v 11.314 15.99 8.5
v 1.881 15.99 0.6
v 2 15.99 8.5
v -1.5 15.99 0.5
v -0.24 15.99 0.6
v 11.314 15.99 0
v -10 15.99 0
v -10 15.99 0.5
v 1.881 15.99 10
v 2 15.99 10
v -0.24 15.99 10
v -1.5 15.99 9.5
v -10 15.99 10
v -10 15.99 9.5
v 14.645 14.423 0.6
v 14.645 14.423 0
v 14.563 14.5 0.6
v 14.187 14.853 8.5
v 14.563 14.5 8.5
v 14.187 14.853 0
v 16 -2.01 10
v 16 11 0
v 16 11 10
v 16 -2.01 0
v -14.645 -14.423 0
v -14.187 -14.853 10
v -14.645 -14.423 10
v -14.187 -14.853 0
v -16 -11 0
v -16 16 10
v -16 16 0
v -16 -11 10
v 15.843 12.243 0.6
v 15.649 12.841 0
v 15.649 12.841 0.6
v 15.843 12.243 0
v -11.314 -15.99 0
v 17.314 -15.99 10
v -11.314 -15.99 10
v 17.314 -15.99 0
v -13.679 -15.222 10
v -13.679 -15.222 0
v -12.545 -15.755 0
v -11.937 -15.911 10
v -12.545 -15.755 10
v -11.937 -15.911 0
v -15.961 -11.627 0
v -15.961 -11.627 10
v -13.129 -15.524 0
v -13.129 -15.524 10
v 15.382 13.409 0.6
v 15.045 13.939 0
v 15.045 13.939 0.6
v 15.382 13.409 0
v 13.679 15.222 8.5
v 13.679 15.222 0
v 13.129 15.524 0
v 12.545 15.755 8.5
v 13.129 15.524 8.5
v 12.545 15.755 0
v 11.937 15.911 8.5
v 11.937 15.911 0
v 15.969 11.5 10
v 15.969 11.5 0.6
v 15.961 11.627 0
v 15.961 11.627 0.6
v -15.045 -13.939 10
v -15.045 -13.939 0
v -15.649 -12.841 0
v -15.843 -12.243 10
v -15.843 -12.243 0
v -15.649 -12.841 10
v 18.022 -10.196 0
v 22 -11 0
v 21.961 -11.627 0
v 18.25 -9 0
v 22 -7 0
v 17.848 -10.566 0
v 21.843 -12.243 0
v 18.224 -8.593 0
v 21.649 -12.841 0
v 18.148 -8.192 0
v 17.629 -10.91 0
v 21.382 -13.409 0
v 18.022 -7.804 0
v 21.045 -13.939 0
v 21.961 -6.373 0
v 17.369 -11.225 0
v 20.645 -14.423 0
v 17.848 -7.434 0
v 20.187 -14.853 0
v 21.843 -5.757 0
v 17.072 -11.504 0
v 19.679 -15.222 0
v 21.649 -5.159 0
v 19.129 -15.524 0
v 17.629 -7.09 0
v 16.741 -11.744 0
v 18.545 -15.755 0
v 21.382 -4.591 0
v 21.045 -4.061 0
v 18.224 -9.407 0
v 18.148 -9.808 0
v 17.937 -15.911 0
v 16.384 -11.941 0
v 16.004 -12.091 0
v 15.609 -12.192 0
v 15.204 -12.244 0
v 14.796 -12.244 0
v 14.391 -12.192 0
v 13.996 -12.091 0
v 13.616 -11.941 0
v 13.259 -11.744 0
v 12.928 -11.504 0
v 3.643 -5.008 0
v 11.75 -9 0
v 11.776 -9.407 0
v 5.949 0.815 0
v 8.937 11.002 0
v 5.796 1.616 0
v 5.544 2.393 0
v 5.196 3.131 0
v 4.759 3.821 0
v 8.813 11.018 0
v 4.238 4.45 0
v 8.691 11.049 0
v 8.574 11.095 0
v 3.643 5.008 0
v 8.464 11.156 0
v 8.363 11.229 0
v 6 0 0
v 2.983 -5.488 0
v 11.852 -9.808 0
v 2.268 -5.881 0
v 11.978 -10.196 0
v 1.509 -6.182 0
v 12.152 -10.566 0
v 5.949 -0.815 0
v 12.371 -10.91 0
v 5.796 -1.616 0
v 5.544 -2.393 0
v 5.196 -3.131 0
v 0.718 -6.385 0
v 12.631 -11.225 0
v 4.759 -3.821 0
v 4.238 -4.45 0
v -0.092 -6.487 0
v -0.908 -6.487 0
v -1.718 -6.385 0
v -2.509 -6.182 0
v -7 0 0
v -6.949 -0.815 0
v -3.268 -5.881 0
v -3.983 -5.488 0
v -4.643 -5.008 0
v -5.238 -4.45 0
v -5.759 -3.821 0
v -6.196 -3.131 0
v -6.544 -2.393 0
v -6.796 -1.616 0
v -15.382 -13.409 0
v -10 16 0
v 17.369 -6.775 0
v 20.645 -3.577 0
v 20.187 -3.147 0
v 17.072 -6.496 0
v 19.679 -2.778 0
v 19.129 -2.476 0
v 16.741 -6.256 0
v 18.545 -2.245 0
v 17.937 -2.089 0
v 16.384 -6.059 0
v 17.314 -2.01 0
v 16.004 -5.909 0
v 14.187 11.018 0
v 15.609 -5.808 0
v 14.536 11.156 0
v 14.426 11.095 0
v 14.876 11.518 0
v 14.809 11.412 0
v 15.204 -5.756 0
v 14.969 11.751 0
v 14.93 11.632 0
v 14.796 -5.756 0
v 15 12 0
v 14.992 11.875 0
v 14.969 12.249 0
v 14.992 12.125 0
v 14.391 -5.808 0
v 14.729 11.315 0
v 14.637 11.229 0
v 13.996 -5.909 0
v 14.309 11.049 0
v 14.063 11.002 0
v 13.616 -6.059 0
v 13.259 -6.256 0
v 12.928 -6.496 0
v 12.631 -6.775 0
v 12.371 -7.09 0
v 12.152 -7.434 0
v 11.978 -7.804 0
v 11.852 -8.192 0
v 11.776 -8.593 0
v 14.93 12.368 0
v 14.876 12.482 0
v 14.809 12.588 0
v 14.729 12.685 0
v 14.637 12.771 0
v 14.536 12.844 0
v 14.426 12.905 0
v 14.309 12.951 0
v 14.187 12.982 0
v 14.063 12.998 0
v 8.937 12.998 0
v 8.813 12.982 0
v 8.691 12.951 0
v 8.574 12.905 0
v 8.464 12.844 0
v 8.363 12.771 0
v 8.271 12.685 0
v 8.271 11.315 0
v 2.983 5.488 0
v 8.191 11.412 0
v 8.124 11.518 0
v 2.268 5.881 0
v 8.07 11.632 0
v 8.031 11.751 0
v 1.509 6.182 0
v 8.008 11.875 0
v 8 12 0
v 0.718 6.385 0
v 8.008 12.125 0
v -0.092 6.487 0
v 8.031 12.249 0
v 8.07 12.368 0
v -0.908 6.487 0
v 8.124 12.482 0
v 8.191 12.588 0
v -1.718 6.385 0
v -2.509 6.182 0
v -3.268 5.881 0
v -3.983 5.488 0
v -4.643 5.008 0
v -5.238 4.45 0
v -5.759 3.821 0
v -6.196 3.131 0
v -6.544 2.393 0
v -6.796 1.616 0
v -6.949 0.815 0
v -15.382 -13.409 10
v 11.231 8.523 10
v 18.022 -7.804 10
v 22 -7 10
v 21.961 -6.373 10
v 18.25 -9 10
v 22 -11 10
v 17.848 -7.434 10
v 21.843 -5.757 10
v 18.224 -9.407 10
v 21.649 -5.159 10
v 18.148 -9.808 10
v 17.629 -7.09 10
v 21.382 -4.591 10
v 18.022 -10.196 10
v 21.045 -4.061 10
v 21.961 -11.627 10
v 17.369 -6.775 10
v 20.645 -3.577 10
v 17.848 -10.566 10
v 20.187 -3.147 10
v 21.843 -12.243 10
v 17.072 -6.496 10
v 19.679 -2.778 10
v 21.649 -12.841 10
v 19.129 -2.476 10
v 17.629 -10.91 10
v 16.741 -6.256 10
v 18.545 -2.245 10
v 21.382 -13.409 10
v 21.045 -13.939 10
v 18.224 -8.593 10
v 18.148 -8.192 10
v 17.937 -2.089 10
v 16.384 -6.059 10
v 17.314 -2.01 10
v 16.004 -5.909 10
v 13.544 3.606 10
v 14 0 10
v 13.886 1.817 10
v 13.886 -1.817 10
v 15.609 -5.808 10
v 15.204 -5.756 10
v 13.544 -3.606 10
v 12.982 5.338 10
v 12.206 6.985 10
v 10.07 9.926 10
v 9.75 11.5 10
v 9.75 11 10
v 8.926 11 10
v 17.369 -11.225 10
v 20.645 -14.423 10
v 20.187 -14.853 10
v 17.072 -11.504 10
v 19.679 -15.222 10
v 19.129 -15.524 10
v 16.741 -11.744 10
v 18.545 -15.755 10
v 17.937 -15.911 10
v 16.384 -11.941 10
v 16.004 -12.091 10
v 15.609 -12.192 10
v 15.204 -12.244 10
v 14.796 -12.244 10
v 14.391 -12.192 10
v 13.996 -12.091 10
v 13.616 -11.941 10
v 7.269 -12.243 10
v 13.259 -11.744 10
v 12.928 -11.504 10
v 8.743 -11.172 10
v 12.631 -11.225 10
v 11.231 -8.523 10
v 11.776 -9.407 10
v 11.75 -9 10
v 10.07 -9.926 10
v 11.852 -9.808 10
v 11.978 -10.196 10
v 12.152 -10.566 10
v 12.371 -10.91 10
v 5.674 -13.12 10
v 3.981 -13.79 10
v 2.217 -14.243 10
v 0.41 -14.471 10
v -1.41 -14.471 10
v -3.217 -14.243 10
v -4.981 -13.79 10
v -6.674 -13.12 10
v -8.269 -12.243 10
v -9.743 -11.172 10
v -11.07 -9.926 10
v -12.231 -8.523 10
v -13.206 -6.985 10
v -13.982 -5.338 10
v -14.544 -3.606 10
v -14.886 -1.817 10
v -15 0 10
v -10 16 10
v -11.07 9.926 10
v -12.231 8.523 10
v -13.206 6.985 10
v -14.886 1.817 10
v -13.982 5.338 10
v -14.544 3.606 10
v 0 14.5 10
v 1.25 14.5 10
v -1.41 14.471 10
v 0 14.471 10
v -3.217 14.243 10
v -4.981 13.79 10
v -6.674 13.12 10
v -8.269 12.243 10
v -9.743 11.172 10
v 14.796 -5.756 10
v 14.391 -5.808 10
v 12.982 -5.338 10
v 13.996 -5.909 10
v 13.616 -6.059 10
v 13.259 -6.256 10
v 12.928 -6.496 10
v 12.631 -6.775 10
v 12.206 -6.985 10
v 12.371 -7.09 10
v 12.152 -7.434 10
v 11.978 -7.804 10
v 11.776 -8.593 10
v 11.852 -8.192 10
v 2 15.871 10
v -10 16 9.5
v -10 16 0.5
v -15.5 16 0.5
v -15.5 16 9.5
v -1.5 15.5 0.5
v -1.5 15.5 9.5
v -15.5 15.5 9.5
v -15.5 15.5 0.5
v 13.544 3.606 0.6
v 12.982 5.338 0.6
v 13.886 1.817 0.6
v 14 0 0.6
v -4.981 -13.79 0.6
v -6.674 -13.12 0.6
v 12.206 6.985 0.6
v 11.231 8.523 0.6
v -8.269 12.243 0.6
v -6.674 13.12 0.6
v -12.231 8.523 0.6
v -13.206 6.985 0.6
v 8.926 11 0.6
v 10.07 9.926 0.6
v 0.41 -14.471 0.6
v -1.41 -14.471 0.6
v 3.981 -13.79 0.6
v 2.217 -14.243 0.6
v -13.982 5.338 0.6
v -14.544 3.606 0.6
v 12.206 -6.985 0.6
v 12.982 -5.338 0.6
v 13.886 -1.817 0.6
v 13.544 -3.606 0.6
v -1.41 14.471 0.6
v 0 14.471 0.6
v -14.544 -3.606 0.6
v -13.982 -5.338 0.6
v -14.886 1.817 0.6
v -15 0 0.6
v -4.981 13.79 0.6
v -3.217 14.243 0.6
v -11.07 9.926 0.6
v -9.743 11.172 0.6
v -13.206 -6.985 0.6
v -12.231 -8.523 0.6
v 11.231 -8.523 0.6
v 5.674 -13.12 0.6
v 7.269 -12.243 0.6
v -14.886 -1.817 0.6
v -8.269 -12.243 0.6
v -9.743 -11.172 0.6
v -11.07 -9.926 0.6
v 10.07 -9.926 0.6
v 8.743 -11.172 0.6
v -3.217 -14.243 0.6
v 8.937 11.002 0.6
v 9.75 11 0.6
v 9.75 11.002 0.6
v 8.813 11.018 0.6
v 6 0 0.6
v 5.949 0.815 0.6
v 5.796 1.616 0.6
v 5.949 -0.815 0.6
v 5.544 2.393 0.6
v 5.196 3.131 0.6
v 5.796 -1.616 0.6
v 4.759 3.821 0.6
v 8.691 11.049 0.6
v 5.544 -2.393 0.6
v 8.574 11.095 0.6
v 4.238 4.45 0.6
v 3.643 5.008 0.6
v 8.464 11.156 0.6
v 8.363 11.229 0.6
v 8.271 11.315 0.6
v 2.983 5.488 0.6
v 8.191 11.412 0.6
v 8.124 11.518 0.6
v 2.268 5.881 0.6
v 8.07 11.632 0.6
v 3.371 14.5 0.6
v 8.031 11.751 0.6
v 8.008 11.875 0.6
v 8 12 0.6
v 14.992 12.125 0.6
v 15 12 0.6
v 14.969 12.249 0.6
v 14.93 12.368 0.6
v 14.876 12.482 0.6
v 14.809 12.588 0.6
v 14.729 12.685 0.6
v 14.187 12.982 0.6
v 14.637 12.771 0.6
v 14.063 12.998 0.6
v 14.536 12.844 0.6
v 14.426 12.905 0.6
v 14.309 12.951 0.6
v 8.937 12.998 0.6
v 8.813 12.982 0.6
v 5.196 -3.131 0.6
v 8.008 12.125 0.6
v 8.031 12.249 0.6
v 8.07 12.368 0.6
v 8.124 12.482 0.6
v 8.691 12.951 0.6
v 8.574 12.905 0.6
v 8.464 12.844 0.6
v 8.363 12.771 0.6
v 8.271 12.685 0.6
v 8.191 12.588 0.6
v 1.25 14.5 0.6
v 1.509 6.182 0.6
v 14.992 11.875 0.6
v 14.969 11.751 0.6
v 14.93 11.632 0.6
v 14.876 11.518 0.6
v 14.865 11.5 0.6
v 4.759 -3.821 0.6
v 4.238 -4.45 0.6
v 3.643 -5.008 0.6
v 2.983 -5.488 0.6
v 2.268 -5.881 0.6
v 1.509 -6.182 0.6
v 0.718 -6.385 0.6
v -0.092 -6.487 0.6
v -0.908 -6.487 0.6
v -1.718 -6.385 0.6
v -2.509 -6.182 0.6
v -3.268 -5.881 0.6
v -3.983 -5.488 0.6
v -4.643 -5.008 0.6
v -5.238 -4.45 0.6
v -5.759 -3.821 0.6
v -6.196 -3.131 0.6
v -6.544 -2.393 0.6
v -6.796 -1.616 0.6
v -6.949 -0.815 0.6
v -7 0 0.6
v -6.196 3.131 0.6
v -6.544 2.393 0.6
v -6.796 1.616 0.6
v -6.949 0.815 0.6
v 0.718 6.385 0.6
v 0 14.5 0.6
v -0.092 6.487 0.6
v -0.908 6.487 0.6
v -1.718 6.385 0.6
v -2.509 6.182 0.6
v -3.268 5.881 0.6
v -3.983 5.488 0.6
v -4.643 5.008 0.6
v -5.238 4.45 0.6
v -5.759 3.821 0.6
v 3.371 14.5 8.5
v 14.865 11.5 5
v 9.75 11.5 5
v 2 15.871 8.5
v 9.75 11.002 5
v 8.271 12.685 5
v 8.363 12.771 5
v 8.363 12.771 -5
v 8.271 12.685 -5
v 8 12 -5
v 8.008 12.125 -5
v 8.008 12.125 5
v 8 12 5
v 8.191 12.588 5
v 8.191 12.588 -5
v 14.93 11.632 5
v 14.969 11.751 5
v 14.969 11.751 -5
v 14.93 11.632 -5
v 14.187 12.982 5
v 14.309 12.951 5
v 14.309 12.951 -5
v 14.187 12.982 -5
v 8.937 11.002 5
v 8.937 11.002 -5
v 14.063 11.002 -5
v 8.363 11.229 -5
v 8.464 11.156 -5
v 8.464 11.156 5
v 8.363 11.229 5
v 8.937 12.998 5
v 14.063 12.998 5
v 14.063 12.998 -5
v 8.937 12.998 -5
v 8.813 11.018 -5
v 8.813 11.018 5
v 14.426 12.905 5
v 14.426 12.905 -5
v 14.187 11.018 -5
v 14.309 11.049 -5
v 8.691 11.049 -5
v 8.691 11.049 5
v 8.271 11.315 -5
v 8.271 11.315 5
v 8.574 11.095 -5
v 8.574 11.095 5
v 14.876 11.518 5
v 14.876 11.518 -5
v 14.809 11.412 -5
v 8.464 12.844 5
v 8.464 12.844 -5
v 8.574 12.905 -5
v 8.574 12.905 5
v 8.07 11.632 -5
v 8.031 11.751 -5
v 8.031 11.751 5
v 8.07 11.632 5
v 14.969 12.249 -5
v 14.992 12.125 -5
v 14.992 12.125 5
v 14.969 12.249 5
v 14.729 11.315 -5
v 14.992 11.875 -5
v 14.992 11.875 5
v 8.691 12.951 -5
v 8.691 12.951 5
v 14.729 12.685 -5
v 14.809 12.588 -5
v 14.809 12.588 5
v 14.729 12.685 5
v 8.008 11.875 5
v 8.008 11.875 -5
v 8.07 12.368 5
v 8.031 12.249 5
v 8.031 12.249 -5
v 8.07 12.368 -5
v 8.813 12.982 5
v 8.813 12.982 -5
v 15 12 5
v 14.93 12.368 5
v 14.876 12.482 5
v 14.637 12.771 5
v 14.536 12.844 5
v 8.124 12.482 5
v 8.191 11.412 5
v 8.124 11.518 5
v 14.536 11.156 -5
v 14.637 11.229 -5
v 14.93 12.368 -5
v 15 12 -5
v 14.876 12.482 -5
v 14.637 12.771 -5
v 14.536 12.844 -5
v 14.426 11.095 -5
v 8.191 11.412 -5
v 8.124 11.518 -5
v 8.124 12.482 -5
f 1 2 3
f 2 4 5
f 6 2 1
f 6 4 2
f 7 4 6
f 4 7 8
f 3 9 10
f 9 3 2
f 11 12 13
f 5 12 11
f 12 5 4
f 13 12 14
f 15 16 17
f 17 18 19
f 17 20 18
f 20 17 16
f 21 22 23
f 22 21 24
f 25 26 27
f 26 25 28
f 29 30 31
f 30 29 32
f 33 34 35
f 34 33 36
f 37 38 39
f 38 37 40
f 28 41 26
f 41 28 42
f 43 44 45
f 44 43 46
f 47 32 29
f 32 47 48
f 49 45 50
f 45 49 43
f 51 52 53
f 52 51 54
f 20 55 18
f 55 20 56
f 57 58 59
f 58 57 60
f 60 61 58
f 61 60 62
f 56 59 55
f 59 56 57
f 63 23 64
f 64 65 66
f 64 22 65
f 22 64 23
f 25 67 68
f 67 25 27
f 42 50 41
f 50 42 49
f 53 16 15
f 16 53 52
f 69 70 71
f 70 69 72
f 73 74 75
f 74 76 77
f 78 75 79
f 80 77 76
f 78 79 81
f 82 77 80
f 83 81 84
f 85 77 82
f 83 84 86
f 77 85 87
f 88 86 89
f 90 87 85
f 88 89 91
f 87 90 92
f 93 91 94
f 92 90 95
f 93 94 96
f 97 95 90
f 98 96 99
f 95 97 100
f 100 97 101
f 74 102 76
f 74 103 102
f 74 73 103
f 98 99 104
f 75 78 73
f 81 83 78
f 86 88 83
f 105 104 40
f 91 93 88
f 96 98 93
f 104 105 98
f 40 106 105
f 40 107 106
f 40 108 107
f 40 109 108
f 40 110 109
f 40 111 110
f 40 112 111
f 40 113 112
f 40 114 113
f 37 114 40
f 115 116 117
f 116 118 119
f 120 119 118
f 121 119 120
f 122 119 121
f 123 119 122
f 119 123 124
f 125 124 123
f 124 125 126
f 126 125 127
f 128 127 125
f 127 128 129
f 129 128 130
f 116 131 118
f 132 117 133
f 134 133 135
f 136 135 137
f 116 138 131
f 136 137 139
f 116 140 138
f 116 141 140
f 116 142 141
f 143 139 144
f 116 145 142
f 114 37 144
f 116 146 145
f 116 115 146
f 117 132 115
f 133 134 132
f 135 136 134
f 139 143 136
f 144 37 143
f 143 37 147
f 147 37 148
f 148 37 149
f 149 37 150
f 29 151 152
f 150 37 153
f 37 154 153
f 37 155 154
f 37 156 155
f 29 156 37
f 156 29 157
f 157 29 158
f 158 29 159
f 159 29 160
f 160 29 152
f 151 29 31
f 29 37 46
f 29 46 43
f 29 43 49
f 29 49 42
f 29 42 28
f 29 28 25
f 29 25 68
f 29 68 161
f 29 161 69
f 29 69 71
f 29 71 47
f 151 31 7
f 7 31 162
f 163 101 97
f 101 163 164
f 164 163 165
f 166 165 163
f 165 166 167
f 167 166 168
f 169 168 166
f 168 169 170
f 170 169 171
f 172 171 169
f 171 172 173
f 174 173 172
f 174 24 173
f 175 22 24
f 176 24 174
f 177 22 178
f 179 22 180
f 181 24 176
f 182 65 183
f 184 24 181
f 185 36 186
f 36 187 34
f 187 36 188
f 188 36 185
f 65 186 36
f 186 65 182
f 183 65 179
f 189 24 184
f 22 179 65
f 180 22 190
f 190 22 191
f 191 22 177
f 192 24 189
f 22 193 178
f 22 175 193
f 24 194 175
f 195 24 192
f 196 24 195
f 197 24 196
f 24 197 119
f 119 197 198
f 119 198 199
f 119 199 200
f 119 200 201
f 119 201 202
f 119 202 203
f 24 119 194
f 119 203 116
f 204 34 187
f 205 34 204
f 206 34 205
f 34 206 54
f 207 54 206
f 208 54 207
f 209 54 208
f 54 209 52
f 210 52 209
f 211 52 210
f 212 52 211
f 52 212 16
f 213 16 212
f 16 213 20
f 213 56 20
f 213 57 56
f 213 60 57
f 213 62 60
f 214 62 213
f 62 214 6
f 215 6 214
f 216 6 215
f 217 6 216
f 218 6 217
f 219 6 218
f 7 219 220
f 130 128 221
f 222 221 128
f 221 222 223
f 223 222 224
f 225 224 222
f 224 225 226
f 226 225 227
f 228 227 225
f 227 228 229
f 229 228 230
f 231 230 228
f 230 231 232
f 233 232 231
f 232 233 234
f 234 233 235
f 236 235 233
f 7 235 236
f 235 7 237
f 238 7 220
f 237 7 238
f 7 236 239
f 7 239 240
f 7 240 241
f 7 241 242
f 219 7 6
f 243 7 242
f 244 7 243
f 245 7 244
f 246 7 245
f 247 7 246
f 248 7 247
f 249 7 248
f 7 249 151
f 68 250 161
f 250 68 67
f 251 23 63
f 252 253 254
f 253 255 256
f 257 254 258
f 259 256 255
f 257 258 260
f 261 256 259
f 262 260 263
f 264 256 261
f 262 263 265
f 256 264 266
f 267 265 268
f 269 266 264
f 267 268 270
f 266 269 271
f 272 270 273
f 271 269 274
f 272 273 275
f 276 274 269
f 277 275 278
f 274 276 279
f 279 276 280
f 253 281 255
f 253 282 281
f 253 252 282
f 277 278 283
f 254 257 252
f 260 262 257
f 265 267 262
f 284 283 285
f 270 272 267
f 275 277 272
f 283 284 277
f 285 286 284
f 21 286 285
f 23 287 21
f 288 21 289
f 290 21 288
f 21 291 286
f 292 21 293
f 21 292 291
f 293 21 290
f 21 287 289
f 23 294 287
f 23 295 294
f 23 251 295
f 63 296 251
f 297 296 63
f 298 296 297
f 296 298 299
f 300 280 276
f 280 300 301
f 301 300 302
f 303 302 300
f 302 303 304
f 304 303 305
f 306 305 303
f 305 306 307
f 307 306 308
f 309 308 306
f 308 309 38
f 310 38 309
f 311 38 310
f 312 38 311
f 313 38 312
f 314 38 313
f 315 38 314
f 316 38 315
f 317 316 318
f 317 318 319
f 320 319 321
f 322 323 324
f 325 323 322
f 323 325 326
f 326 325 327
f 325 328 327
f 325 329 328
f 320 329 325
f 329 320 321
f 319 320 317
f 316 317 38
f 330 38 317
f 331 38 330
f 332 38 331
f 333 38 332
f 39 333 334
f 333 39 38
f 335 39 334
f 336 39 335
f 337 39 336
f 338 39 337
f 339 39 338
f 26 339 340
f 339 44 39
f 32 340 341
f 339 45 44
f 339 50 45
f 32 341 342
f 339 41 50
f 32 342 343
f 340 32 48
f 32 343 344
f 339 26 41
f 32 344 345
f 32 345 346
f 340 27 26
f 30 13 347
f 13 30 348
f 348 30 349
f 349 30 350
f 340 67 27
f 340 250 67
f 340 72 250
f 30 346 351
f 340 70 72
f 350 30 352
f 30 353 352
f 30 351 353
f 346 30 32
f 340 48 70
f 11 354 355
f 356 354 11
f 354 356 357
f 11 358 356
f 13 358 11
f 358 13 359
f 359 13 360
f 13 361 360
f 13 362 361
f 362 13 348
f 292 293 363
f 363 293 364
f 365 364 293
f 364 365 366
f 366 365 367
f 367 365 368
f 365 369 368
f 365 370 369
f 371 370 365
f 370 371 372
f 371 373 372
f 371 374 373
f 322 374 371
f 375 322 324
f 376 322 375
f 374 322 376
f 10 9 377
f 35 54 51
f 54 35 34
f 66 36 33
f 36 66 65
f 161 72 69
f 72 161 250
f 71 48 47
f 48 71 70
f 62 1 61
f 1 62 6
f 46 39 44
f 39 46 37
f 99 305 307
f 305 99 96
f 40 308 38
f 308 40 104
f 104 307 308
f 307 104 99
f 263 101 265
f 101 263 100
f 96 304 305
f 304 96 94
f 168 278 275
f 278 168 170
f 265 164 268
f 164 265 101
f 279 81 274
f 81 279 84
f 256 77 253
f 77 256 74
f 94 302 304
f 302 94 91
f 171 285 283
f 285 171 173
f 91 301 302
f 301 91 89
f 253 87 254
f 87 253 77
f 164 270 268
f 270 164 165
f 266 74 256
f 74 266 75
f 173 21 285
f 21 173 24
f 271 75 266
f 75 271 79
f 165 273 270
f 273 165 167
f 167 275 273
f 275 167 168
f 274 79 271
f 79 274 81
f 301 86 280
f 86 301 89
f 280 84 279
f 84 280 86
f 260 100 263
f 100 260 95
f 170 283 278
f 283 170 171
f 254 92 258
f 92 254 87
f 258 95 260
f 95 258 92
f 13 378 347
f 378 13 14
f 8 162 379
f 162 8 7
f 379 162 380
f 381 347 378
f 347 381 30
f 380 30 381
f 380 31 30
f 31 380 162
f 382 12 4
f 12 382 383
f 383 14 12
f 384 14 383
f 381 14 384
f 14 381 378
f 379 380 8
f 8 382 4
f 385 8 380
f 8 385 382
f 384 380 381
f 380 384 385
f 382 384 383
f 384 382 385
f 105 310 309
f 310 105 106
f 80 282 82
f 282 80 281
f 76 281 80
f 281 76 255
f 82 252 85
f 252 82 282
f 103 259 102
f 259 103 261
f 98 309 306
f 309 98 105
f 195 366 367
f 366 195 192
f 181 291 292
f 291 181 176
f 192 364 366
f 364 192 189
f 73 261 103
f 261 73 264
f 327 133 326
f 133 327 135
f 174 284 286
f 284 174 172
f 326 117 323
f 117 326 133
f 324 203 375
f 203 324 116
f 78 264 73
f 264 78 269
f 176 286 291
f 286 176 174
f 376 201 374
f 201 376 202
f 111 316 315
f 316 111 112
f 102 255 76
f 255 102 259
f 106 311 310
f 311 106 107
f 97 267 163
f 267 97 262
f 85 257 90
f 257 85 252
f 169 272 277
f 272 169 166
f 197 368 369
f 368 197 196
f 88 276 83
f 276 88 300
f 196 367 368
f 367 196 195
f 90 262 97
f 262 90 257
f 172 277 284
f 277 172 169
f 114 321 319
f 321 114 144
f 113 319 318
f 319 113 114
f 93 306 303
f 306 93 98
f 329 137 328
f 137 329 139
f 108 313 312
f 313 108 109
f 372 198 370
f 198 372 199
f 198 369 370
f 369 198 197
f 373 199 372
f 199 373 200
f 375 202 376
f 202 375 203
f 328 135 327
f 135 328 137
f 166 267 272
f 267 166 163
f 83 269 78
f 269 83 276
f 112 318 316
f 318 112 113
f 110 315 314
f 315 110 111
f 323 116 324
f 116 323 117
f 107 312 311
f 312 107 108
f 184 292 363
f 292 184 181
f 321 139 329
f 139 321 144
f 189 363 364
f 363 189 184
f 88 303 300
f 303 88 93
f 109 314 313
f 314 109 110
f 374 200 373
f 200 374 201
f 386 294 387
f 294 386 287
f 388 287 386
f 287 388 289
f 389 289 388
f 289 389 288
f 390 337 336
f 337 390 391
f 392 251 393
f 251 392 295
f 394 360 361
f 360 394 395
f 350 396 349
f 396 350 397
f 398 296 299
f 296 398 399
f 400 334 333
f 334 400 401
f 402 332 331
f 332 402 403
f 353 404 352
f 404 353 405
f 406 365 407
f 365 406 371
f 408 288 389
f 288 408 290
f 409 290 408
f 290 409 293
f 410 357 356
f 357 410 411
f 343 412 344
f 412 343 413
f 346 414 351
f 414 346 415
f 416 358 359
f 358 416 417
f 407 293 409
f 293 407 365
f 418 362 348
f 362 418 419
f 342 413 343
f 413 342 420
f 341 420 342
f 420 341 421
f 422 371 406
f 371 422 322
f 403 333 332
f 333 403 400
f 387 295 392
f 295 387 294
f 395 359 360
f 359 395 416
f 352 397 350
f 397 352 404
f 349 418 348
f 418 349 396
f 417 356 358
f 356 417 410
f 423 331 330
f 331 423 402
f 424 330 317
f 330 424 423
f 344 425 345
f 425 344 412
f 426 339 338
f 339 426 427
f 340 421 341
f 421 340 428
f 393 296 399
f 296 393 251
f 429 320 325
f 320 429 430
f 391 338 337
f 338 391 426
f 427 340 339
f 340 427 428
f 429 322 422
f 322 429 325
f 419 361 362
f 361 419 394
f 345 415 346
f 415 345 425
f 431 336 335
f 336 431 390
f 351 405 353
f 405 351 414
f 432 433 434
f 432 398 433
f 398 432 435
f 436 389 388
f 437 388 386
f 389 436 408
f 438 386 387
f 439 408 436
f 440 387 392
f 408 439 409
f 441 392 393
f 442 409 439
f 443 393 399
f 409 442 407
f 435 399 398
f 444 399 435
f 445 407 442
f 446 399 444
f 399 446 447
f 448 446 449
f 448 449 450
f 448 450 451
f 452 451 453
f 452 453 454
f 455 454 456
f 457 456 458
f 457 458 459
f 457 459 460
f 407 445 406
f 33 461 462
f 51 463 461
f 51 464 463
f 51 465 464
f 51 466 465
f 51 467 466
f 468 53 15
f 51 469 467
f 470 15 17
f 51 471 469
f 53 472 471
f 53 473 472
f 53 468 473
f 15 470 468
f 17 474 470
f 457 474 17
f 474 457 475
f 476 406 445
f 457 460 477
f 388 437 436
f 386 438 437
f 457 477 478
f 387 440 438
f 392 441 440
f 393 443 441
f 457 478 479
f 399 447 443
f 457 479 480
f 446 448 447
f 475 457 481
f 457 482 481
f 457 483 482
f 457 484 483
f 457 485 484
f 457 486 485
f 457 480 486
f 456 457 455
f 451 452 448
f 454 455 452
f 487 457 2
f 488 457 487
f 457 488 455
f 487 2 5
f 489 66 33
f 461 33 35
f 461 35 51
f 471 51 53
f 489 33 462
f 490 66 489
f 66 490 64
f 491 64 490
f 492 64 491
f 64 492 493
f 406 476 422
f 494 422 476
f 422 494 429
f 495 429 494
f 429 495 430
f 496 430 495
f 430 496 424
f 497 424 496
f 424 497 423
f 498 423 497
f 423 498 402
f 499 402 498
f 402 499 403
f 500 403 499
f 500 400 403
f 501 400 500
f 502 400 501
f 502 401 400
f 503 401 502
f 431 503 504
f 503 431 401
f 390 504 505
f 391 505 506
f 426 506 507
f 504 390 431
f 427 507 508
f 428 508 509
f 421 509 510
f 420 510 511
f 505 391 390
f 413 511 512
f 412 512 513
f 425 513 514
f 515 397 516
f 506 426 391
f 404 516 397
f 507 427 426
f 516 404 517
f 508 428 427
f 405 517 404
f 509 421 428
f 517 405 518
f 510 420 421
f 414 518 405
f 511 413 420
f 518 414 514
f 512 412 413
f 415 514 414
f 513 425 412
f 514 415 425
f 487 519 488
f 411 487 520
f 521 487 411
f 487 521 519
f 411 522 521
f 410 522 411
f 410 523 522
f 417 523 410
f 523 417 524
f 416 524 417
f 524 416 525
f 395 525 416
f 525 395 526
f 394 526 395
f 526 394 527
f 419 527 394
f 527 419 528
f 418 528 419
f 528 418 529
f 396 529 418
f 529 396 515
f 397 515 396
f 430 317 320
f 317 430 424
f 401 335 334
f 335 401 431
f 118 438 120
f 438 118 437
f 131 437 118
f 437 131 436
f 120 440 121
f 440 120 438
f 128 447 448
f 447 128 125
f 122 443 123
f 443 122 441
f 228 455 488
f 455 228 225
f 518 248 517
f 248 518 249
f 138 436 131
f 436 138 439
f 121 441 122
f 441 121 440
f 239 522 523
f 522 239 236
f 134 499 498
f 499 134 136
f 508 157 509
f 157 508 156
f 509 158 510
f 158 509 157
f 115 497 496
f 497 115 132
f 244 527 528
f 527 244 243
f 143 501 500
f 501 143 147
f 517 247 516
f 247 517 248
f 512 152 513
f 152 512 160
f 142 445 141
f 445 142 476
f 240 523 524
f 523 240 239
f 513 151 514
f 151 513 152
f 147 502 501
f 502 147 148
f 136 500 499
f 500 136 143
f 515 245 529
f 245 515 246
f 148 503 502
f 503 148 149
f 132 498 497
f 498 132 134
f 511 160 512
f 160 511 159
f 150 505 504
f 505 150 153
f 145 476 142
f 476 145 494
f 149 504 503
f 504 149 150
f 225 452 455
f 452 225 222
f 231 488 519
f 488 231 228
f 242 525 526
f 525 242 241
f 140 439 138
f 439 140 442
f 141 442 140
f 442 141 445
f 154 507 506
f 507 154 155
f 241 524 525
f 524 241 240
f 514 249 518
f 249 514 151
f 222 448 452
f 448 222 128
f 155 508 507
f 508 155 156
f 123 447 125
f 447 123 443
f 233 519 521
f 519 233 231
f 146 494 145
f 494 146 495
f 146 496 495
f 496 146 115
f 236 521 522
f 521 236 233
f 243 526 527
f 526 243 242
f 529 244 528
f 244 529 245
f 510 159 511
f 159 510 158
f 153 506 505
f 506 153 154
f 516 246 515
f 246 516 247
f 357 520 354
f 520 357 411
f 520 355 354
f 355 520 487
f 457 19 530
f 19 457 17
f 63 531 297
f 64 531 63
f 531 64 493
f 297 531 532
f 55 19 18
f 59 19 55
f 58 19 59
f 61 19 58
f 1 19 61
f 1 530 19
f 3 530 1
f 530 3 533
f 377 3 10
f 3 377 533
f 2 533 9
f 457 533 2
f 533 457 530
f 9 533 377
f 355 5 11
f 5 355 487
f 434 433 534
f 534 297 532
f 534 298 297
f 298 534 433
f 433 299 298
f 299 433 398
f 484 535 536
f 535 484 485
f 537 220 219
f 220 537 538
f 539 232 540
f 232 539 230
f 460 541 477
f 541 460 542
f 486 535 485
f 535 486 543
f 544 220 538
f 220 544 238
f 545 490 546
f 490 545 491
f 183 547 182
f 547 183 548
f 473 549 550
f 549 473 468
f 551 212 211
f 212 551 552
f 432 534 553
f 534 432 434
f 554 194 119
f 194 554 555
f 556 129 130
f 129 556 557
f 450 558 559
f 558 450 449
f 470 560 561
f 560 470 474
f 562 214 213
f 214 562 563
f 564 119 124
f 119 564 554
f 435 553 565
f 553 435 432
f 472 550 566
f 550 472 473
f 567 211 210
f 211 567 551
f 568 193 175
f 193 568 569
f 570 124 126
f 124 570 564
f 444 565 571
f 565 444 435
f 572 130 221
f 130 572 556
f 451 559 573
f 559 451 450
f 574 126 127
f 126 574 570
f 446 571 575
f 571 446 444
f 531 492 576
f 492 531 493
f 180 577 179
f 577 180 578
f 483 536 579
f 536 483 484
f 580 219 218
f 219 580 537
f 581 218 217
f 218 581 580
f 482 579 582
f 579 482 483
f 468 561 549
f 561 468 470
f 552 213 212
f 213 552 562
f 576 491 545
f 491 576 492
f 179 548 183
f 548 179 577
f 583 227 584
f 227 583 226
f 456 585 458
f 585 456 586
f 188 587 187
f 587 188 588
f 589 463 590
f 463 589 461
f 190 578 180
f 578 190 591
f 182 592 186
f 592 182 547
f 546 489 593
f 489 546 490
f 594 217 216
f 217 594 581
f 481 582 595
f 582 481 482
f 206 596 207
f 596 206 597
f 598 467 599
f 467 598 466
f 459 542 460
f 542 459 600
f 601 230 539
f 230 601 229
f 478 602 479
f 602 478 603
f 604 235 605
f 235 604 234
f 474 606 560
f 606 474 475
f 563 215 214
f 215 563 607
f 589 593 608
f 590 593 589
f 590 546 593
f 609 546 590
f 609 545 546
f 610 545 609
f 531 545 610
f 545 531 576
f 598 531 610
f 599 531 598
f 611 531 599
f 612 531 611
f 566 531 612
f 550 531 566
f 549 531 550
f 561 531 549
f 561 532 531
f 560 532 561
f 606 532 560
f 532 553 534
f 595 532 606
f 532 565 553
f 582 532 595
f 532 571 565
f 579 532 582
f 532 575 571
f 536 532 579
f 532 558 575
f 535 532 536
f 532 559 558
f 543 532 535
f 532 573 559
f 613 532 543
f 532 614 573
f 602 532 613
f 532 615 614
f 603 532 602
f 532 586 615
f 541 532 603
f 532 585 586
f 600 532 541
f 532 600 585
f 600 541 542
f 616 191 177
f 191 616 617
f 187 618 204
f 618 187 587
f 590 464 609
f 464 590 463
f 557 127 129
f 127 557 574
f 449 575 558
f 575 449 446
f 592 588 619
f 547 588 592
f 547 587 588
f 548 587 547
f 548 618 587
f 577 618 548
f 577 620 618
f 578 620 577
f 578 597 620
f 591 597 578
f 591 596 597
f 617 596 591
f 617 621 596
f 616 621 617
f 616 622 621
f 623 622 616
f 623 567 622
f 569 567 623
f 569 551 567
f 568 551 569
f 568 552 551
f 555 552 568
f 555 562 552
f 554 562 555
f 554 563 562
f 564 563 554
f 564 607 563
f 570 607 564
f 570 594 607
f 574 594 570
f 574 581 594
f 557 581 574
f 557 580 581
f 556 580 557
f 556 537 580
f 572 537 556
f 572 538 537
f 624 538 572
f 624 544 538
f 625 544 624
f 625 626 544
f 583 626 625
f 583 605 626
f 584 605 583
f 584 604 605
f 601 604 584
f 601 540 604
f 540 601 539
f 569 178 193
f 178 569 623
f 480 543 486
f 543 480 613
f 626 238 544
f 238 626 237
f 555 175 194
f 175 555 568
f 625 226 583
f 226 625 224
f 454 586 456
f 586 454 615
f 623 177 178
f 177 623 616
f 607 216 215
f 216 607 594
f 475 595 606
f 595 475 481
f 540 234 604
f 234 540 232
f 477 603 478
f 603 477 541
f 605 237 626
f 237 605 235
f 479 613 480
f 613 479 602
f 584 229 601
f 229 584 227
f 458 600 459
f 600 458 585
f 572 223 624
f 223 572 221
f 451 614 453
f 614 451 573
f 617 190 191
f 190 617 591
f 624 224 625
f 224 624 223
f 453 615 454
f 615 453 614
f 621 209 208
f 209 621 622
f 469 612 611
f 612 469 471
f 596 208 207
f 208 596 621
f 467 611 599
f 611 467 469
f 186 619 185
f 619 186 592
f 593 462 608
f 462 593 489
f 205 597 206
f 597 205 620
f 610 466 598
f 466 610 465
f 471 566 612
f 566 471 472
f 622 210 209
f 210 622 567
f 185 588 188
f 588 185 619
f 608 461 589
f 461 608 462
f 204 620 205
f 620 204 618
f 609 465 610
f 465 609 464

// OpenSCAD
$fn = 50;


union() {
	difference() {
		union() {
			hull() {
				translate(v = [-11.0000000000, 11.0000000000, 0]) {
					cylinder(h = 10, r = 5);
				}
				translate(v = [11.0000000000, 11.0000000000, 0]) {
					cylinder(h = 10, r = 5);
				}
				translate(v = [-11.0000000000, -11.0000000000, 0]) {
					cylinder(h = 10, r = 5);
				}
				translate(v = [11.0000000000, -11.0000000000, 0]) {
					cylinder(h = 10, r = 5);
				}
			}
			translate(v = [7.5000000000, -9.0000000000, 0]) {
				hull() {
					translate(v = [-9.5000000000, 2.0000000000, 0]) {
						cylinder(h = 10, r = 5);
					}
					translate(v = [9.5000000000, 2.0000000000, 0]) {
						cylinder(h = 10, r = 5);
					}
					translate(v = [-9.5000000000, -2.0000000000, 0]) {
						cylinder(h = 10, r = 5);
					}
					translate(v = [9.5000000000, -2.0000000000, 0]) {
						cylinder(h = 10, r = 5);
					}
				}
			}
			translate(v = [-16.0000000000, 10.0000000000, 0]) {
				cube(size = [6, 6, 10]);
			}
		}
		union() {
			translate(v = [-15.5000000000, 15.5000000000, 0.5000000000]) {
				cube(size = [14, 0.5000000000, 9.0000000000]);
			}
			translate(v = [15.0000000000, -9.0000000000, -100.0000000000]) {
				cylinder(h = 200, r = 3.2500000000);
			}
			translate(v = [-0.5000000000, 0.0000000000, 0.6000000000]) {
				cylinder(h = 12.4000000000, r = 14.5000000000);
			}
			translate(v = [-0.5000000000, 0.0000000000, -5.0000000000]) {
				cylinder(h = 10, r = 6.5000000000);
			}
			translate(v = [0.0000000000, 11.5000000000, 0.6000000000]) {
				cube(size = [16.0000000000, 3, 12.4000000000]);
			}
			translate(v = [2.0000000000, 11.5000000000, 8.5000000000]) {
				cube(size = [14.0000000000, 6, 1.5000000000]);
			}
			translate(v = [-3.0000000000, 18.7500000000, 0.6000000000]) {
				rotate(a = [0, 0, -45]) {
					cube(size = [10, 1.5000000000, 12.4000000000]);
				}
			}
			translate(v = [2.2500000000, 11.0000000000, 0.6000000000]) {
				cube(size = [7.5000000000, 2, 9.4000000000]);
			}
		}
	}
	union() {
		translate(v = [11.5000000000, 12, -5.0000000000]) {
			rotate(a = [0, 0, 0]) {
				difference() {
					union() {
						hull() {
							translate(v = [2.5000000000, 0, 0]) {
								cylinder(h = 10, r = 1.0000000000, r1 = 1.0000000000, r2 = 1.0000000000);
							}
							translate(v = [-2.5000000000, 0, 0]) {
								cylinder(h = 10, r = 1.0000000000, r1 = 1.0000000000, r2 = 1.0000000000);
							}
						}
					}
					union();
				}
			}
		}
	}
}
